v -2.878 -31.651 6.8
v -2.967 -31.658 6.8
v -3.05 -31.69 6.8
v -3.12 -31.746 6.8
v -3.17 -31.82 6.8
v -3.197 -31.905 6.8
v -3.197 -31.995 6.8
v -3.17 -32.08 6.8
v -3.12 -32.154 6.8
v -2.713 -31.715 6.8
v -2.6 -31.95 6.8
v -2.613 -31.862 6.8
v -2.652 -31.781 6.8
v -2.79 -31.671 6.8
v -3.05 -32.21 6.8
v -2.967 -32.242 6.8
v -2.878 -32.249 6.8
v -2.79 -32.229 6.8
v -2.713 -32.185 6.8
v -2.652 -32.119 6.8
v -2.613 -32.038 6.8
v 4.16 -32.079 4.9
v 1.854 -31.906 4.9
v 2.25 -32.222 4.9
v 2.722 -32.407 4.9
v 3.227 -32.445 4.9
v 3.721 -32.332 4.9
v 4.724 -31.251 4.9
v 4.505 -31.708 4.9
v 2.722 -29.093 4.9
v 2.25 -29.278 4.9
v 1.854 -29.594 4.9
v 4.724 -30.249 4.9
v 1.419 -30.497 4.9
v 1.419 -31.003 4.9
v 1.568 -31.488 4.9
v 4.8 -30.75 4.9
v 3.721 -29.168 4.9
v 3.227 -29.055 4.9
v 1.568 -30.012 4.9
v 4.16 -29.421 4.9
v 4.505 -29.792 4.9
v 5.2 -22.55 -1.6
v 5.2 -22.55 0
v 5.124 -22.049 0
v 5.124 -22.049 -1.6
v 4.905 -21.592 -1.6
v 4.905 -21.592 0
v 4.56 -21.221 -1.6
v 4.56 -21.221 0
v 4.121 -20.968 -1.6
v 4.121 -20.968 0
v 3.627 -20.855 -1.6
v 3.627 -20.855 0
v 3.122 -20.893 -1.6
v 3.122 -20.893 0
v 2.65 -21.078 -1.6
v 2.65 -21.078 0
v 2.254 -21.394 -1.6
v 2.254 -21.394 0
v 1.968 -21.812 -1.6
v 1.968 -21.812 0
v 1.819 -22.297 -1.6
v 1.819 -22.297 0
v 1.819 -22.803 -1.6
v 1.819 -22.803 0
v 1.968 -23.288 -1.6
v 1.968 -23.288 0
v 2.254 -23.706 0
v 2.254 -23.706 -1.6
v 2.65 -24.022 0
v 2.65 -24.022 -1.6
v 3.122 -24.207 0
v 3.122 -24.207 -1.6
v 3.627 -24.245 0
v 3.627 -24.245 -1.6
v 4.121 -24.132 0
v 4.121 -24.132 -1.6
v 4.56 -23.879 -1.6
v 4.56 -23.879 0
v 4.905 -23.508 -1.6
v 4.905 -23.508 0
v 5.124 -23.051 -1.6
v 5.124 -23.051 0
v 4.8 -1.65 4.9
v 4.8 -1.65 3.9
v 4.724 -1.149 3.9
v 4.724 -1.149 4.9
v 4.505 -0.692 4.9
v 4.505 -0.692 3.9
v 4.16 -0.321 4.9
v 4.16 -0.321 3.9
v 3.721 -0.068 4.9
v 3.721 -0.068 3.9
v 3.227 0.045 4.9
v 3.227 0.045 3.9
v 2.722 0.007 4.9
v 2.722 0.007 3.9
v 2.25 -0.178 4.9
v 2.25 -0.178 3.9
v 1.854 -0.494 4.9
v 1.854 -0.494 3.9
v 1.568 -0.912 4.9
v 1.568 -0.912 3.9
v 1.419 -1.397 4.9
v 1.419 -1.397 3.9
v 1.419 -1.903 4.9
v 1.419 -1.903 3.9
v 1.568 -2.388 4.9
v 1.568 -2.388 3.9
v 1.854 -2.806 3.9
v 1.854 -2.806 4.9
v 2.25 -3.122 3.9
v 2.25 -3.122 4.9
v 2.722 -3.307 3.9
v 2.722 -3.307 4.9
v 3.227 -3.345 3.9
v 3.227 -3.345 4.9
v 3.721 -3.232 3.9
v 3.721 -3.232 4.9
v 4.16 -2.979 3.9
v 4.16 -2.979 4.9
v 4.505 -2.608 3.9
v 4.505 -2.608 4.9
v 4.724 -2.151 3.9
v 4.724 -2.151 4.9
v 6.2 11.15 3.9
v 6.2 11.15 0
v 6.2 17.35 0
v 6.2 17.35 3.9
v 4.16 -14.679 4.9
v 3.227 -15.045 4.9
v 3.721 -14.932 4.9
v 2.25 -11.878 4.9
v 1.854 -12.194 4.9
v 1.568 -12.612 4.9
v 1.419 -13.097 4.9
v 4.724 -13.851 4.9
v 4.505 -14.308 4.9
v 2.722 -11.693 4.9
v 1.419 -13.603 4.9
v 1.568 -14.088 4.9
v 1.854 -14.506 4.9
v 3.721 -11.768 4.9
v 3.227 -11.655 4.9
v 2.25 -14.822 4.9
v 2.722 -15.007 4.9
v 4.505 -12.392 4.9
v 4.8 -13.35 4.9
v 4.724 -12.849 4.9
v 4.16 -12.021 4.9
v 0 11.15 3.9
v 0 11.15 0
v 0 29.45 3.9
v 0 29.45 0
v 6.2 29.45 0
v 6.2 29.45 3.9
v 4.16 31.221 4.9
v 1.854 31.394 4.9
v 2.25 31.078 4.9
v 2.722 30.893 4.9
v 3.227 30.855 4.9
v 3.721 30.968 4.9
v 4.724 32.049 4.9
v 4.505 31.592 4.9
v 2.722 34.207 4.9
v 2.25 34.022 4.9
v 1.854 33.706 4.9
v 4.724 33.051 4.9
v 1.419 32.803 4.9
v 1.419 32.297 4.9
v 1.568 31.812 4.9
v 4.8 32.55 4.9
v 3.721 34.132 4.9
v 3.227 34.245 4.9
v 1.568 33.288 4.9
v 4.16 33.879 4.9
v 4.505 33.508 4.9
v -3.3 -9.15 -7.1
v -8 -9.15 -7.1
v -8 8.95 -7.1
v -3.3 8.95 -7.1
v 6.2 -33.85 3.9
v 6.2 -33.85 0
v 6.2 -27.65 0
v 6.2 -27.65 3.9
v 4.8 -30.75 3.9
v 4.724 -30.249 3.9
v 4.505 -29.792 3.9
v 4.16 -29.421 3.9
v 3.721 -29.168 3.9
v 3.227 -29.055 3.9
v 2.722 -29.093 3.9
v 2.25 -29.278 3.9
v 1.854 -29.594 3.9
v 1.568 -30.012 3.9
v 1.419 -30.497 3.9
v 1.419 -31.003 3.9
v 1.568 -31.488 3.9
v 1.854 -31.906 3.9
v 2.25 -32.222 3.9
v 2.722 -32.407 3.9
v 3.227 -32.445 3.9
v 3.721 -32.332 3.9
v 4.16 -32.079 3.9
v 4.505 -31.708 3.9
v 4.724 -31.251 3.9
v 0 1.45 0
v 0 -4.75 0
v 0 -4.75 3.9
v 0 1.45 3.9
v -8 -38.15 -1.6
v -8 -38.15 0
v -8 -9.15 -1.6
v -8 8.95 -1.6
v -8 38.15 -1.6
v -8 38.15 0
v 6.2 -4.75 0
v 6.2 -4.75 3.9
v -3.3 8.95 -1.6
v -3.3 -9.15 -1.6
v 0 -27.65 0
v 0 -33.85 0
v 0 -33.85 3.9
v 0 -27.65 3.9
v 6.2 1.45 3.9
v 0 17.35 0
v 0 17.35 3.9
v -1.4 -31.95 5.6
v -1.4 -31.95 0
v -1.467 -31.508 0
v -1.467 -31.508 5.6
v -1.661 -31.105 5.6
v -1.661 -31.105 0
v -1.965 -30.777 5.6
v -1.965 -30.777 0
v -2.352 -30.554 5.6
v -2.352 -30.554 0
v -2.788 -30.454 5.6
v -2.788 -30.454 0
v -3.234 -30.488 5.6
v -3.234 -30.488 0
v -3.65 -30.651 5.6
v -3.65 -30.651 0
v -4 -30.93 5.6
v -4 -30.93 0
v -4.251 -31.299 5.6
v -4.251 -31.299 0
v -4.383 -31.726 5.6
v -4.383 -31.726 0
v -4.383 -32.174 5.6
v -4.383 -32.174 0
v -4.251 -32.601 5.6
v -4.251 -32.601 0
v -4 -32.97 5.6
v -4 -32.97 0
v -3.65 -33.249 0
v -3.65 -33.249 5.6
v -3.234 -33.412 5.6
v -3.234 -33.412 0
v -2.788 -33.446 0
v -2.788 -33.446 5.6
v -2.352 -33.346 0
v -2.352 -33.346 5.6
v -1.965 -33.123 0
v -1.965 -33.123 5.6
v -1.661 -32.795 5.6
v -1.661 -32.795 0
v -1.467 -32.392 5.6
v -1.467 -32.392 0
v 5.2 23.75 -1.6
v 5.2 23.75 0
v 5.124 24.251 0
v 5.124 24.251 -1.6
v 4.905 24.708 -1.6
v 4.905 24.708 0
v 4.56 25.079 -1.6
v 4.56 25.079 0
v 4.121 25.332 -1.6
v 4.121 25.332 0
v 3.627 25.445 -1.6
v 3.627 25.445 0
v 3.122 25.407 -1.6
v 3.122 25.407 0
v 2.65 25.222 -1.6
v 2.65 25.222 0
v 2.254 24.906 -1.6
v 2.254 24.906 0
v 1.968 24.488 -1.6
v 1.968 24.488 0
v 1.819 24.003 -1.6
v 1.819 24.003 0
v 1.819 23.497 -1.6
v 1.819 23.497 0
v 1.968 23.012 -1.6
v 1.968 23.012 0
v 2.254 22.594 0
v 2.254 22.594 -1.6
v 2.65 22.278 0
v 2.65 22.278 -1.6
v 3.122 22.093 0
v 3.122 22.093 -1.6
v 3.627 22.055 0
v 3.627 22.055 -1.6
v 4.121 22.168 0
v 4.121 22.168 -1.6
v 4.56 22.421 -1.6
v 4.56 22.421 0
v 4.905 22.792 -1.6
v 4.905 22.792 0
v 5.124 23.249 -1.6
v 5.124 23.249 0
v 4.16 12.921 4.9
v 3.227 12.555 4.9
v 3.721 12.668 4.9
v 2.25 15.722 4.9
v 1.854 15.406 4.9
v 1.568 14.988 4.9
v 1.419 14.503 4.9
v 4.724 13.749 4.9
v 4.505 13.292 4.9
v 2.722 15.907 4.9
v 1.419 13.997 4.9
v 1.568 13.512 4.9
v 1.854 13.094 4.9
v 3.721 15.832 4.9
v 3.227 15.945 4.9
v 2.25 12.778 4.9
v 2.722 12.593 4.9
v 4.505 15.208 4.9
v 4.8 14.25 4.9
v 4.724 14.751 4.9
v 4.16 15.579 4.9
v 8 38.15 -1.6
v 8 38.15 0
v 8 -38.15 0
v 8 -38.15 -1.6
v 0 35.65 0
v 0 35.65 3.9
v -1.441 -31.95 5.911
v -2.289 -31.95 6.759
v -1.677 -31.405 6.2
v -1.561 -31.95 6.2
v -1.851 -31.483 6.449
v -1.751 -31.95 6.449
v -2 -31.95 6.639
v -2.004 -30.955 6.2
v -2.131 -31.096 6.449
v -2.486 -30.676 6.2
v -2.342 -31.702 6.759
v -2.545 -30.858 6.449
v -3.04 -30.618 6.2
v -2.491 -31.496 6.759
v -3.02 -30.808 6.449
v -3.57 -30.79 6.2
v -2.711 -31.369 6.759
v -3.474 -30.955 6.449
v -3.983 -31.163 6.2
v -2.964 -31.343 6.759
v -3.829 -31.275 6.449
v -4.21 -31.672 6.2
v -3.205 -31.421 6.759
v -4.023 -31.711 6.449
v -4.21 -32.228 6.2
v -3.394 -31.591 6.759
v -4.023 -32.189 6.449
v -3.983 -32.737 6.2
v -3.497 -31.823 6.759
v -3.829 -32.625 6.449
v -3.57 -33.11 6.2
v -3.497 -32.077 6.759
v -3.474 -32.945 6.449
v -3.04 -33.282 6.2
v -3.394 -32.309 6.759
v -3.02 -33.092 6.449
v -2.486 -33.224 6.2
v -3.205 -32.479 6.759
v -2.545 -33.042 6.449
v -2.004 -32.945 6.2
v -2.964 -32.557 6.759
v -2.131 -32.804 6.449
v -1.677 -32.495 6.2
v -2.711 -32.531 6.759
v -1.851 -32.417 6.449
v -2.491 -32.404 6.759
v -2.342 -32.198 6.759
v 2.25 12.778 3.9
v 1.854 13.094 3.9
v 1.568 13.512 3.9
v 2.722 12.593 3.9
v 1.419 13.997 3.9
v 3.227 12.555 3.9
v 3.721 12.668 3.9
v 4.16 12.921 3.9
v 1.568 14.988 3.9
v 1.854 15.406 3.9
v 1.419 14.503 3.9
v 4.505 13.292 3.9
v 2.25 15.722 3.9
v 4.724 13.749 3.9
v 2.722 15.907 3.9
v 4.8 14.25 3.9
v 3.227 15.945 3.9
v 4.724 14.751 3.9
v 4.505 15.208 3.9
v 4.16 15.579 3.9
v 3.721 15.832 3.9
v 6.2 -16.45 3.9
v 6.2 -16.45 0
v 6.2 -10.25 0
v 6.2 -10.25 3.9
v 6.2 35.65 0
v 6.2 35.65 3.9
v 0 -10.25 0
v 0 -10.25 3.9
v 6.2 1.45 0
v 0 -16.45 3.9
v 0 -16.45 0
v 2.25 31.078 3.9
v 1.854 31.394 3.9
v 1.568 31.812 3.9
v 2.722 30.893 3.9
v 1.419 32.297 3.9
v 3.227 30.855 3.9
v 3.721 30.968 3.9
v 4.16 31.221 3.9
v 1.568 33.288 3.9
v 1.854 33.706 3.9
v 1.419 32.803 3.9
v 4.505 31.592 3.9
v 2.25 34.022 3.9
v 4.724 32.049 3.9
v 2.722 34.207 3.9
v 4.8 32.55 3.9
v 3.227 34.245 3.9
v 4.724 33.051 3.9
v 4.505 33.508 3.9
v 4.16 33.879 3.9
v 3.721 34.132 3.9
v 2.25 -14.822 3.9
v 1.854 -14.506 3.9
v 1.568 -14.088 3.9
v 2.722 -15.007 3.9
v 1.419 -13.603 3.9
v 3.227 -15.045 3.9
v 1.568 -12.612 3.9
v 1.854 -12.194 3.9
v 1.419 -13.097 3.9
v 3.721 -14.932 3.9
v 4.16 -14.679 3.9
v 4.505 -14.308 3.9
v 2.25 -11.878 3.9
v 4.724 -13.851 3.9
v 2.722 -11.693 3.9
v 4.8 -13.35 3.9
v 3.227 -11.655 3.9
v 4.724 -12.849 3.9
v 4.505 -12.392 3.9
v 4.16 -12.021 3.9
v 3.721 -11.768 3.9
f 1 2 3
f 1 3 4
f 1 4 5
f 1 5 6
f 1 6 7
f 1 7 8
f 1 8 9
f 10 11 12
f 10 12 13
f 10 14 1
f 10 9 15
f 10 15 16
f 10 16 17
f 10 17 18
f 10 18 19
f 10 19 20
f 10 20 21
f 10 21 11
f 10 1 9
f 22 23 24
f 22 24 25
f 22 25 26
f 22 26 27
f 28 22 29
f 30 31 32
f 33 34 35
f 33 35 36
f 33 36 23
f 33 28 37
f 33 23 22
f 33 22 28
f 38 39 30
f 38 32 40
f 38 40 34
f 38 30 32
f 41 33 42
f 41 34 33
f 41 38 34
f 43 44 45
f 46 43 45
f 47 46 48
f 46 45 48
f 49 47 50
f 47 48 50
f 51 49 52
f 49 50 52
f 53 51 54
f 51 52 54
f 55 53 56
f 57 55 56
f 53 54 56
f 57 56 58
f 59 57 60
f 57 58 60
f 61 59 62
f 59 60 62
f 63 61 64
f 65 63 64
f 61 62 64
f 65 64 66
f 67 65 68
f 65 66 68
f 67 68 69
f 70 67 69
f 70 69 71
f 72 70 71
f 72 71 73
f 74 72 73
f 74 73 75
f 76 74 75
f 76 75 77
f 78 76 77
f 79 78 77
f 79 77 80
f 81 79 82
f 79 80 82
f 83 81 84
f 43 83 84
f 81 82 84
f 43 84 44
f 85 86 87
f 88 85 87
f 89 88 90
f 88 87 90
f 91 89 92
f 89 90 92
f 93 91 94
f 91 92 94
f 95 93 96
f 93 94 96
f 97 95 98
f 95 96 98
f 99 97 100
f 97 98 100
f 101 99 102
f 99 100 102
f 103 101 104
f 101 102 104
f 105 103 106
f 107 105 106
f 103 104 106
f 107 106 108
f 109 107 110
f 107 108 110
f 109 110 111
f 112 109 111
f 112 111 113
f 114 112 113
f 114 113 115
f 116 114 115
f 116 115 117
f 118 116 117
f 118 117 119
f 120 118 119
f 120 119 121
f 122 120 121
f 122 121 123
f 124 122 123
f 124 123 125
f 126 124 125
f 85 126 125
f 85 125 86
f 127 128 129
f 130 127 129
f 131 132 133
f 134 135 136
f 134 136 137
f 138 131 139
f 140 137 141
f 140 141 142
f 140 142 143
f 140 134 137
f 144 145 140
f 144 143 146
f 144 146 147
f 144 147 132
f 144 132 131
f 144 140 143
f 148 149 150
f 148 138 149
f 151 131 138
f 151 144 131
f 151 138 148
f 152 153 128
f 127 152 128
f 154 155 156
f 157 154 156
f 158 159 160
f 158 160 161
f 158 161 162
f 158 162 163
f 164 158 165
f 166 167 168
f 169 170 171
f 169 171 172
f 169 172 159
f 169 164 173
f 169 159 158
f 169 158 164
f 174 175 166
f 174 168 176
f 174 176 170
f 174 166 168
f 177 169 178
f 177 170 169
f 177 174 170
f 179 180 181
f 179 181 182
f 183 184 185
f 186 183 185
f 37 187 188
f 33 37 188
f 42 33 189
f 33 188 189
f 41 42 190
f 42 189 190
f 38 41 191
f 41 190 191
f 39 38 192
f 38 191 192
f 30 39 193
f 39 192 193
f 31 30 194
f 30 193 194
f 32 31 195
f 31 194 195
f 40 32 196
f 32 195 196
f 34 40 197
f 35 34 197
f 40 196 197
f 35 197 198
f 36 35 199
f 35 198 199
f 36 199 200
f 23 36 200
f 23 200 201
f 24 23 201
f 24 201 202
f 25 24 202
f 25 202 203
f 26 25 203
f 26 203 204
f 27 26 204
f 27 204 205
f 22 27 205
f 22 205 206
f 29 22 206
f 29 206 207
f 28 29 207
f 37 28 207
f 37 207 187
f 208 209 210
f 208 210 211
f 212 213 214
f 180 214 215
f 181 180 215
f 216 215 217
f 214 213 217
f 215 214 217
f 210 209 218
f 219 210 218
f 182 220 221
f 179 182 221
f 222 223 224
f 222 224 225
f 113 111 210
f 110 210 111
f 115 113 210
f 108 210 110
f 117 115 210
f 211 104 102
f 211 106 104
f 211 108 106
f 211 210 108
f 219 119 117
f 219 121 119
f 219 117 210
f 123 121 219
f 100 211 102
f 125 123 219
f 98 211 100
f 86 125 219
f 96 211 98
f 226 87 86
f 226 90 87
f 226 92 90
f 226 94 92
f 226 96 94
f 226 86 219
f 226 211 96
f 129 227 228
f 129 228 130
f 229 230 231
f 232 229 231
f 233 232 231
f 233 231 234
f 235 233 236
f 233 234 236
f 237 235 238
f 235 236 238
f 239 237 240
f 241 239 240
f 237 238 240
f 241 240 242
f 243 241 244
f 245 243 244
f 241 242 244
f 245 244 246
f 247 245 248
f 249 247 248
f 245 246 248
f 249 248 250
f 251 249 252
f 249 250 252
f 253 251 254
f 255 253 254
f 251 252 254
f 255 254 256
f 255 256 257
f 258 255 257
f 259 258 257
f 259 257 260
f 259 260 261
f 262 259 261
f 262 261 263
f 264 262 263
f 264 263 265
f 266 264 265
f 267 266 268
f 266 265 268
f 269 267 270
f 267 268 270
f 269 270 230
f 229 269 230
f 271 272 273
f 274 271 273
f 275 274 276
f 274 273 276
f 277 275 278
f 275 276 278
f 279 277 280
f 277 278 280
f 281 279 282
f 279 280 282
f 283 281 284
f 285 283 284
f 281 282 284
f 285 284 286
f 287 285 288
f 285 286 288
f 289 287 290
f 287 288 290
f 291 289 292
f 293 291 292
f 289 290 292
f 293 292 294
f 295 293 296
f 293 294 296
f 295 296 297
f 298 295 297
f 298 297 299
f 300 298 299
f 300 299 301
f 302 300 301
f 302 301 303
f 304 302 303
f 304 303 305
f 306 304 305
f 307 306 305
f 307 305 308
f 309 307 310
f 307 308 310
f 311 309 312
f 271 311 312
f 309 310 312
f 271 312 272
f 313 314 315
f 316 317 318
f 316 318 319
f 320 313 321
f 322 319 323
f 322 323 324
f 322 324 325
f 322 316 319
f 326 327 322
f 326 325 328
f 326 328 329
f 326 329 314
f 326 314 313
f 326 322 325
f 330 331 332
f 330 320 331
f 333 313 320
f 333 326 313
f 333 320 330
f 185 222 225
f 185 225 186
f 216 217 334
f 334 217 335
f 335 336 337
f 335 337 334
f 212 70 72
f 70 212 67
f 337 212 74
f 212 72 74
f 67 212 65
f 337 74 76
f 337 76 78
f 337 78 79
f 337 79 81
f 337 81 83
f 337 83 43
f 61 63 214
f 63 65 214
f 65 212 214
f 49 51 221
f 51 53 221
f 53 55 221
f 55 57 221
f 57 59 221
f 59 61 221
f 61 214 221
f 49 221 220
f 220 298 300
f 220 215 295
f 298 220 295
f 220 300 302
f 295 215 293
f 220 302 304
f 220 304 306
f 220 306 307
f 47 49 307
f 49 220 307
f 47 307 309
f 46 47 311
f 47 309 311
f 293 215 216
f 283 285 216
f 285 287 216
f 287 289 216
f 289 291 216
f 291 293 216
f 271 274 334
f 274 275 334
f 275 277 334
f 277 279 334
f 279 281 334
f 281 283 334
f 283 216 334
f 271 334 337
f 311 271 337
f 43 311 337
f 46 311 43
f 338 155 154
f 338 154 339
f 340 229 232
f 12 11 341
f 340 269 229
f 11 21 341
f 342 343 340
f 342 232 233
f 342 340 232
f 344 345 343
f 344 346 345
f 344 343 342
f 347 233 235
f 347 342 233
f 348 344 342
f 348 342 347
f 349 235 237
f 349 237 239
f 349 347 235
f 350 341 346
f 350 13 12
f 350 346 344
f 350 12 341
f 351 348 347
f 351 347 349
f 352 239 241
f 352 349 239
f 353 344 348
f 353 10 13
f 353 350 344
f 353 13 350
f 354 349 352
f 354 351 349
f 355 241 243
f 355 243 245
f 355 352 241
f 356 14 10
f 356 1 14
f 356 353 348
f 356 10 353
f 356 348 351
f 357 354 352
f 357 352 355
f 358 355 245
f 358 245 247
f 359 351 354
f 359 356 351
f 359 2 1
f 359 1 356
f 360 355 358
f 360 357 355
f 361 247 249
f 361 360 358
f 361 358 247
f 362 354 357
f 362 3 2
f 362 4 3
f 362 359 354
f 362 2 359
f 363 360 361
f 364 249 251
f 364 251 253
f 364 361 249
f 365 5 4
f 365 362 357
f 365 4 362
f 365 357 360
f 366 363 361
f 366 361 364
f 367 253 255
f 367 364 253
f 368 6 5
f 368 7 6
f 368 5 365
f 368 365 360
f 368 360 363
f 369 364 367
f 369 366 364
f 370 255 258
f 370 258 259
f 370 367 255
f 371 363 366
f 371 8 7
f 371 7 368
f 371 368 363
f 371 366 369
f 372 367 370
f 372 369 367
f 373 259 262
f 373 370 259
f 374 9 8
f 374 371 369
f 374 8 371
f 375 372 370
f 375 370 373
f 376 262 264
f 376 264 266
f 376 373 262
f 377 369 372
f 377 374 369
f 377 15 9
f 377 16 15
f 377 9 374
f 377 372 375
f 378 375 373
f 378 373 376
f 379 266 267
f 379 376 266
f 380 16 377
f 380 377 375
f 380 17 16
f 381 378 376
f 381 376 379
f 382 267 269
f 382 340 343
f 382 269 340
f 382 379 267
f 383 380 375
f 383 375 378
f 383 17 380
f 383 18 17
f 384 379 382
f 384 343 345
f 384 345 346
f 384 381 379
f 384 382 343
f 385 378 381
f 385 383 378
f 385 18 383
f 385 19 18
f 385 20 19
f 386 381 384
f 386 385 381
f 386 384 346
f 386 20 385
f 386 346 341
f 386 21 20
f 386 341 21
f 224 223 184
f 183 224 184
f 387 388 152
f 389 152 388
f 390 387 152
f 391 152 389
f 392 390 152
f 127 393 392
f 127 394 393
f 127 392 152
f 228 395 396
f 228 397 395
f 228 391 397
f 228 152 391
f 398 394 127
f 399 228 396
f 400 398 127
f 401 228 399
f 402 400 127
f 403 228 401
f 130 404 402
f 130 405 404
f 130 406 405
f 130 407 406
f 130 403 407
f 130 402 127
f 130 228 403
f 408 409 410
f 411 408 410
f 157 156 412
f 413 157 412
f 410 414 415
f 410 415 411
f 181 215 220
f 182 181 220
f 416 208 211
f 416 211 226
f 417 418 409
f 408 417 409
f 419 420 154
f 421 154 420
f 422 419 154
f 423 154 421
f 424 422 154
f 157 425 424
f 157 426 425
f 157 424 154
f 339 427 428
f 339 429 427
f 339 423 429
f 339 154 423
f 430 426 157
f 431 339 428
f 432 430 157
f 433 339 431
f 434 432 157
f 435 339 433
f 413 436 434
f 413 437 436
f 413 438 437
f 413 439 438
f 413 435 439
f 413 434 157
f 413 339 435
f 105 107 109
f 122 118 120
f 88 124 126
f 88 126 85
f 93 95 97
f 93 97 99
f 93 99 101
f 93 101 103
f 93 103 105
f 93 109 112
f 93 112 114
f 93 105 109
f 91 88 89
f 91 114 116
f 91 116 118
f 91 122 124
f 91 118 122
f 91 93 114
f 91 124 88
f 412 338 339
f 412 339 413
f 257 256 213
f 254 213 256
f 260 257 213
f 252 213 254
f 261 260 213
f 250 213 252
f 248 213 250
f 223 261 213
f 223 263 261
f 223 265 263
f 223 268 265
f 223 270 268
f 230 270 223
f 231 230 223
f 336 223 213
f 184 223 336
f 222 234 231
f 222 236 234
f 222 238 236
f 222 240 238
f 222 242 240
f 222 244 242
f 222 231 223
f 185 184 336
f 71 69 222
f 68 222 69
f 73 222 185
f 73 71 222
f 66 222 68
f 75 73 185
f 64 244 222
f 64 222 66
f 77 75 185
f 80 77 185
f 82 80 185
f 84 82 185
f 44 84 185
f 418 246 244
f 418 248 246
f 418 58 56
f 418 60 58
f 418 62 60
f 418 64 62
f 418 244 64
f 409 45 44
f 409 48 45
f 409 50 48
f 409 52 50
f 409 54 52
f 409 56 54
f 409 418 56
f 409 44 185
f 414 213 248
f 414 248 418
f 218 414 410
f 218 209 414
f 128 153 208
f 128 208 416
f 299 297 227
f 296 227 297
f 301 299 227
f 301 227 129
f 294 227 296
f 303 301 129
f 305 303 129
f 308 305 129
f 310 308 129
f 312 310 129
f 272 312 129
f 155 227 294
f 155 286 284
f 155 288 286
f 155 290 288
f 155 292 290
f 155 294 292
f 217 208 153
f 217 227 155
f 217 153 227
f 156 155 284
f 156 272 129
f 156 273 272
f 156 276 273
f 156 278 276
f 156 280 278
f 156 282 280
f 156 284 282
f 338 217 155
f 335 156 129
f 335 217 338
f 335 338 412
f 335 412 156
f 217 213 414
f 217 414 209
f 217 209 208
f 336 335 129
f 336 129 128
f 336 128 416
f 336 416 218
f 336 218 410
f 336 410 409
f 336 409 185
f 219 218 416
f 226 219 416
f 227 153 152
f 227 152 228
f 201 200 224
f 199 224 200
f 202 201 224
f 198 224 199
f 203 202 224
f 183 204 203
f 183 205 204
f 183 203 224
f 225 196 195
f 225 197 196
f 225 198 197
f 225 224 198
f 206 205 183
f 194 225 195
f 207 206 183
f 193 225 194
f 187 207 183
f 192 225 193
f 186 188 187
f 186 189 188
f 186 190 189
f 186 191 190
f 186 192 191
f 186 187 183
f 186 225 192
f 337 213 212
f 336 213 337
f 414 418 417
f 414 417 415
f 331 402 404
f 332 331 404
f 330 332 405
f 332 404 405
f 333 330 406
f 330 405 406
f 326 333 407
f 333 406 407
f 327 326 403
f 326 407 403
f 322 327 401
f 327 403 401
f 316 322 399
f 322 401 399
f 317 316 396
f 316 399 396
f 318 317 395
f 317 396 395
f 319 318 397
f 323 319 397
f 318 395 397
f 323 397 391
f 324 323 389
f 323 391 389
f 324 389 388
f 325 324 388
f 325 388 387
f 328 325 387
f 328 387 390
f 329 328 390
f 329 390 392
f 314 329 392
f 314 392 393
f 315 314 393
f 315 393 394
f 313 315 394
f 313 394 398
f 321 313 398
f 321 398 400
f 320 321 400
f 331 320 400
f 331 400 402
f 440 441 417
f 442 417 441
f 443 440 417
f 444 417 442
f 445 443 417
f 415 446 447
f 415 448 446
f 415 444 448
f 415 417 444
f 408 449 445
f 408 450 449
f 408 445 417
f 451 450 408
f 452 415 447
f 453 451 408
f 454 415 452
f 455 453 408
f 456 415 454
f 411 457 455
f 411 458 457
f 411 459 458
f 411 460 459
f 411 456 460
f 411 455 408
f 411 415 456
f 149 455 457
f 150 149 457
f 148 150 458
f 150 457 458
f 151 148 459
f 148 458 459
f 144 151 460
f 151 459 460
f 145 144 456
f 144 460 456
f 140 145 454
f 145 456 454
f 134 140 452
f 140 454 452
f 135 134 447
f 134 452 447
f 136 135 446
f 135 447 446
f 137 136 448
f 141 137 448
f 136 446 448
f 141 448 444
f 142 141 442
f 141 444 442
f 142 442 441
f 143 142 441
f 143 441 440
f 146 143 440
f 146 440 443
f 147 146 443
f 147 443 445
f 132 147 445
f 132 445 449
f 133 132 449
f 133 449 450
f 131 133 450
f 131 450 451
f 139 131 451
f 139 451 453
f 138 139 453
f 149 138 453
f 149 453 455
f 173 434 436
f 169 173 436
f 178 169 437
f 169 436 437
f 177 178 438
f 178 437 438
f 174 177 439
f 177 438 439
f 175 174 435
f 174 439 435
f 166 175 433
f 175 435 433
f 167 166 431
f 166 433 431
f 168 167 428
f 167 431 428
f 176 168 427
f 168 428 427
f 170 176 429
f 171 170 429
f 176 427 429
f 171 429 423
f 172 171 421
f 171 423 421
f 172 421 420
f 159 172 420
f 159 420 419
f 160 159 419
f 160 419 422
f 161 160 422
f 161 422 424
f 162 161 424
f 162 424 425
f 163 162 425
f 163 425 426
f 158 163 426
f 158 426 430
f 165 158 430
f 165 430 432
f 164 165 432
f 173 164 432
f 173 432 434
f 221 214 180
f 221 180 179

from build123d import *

# Parameters (mm, degrees)
F0_W     = 16
F0_H     = 76.3
F0_R     = 1.7
F1_DEPTH = 1.6
F2_W     = 6.2
F2_H     = 6.2
F2_R     = 1.7
F3_DEPTH = 3.9
F4_DEPTH = 4.9
F2_R_2   = 1.5
F5_DEPTH = 6.8
F6_R     = 1.2
F7_W     = 4.7
F7_H     = 18.1
F8_DEPTH = 5.5


with BuildPart() as f1:
    # F0 (on Top) → F1 (new body)
    with BuildSketch(Plane.XY):
        Rectangle(F0_W, F0_H)
        with Locations((3.5, -22.55)):
            Circle(F0_R, mode=Mode.SUBTRACT)
        with Locations((3.5, 23.75)):
            Circle(F0_R, mode=Mode.SUBTRACT)
    extrude(amount=-F1_DEPTH)

    # F2 (on face) → F3 (join)
    with BuildSketch(Plane.XY):
        with Locations((3.1, -30.75)):
            Rectangle(F2_W, F2_H)
        with Locations((3.1, -30.75)):
            Circle(F2_R, mode=Mode.SUBTRACT)
        with Locations((3.1, -13.35)):
            Rectangle(F2_W, F2_H)
        with Locations((3.1, -13.35)):
            Circle(F2_R, mode=Mode.SUBTRACT)
        with Locations((3.1, -1.65)):
            Rectangle(F2_W, F2_H)
        with Locations((3.1, -1.65)):
            Circle(F2_R, mode=Mode.SUBTRACT)
        with Locations((3.1, 14.25)):
            Rectangle(F2_W, F2_H)
        with Locations((3.1, 14.25)):
            Circle(F2_R, mode=Mode.SUBTRACT)
        with Locations((3.1, 32.55)):
            Rectangle(F2_W, F2_H)
        with Locations((3.1, 32.55)):
            Circle(F2_R, mode=Mode.SUBTRACT)
    extrude(amount=F3_DEPTH)

    # F2 (on face) → F4 (join)
    with BuildSketch(Plane.XY):
        with Locations((3.1, 32.55)):
            Circle(F2_R)
        with Locations((3.1, 14.25)):
            Circle(F2_R)
        with Locations((3.1, -1.65)):
            Circle(F2_R)
        with Locations((3.1, -13.35)):
            Circle(F2_R)
        with Locations((3.1, -30.75)):
            Circle(F2_R)
    extrude(amount=F4_DEPTH)

    # F2 (on face) → F5 (join)
    with BuildSketch(Plane.XY):
        with Locations((-2.9, -31.95)):
            Circle(F2_R_2)
    extrude(amount=F5_DEPTH)

    # F6
    f6_edges = [f1.edges().sort_by_distance(p)[0] for p in [
        (-4.4, -31.95, 6.8),
    ]]
    fillet(f6_edges, radius=F6_R)

    # F7 (on face) → F8 (join)
    with BuildSketch(Plane(origin=(0, 0, -1.6), x_dir=(1, 0, 0), z_dir=(0, 0, -1))):
        with Locations((-5.65, 0.1)):
            Rectangle(F7_W, F7_H)
    extrude(amount=F8_DEPTH)


solid = f1.part
